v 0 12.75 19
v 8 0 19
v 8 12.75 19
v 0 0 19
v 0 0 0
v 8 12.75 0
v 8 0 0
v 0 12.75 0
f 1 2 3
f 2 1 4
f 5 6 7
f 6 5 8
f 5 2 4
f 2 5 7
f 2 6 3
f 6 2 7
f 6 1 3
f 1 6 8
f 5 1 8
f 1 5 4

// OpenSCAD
$fn = 64;

w = 8.0;
d = 12.75;
h = 19.0;

cube([w, d, h], center=false);
